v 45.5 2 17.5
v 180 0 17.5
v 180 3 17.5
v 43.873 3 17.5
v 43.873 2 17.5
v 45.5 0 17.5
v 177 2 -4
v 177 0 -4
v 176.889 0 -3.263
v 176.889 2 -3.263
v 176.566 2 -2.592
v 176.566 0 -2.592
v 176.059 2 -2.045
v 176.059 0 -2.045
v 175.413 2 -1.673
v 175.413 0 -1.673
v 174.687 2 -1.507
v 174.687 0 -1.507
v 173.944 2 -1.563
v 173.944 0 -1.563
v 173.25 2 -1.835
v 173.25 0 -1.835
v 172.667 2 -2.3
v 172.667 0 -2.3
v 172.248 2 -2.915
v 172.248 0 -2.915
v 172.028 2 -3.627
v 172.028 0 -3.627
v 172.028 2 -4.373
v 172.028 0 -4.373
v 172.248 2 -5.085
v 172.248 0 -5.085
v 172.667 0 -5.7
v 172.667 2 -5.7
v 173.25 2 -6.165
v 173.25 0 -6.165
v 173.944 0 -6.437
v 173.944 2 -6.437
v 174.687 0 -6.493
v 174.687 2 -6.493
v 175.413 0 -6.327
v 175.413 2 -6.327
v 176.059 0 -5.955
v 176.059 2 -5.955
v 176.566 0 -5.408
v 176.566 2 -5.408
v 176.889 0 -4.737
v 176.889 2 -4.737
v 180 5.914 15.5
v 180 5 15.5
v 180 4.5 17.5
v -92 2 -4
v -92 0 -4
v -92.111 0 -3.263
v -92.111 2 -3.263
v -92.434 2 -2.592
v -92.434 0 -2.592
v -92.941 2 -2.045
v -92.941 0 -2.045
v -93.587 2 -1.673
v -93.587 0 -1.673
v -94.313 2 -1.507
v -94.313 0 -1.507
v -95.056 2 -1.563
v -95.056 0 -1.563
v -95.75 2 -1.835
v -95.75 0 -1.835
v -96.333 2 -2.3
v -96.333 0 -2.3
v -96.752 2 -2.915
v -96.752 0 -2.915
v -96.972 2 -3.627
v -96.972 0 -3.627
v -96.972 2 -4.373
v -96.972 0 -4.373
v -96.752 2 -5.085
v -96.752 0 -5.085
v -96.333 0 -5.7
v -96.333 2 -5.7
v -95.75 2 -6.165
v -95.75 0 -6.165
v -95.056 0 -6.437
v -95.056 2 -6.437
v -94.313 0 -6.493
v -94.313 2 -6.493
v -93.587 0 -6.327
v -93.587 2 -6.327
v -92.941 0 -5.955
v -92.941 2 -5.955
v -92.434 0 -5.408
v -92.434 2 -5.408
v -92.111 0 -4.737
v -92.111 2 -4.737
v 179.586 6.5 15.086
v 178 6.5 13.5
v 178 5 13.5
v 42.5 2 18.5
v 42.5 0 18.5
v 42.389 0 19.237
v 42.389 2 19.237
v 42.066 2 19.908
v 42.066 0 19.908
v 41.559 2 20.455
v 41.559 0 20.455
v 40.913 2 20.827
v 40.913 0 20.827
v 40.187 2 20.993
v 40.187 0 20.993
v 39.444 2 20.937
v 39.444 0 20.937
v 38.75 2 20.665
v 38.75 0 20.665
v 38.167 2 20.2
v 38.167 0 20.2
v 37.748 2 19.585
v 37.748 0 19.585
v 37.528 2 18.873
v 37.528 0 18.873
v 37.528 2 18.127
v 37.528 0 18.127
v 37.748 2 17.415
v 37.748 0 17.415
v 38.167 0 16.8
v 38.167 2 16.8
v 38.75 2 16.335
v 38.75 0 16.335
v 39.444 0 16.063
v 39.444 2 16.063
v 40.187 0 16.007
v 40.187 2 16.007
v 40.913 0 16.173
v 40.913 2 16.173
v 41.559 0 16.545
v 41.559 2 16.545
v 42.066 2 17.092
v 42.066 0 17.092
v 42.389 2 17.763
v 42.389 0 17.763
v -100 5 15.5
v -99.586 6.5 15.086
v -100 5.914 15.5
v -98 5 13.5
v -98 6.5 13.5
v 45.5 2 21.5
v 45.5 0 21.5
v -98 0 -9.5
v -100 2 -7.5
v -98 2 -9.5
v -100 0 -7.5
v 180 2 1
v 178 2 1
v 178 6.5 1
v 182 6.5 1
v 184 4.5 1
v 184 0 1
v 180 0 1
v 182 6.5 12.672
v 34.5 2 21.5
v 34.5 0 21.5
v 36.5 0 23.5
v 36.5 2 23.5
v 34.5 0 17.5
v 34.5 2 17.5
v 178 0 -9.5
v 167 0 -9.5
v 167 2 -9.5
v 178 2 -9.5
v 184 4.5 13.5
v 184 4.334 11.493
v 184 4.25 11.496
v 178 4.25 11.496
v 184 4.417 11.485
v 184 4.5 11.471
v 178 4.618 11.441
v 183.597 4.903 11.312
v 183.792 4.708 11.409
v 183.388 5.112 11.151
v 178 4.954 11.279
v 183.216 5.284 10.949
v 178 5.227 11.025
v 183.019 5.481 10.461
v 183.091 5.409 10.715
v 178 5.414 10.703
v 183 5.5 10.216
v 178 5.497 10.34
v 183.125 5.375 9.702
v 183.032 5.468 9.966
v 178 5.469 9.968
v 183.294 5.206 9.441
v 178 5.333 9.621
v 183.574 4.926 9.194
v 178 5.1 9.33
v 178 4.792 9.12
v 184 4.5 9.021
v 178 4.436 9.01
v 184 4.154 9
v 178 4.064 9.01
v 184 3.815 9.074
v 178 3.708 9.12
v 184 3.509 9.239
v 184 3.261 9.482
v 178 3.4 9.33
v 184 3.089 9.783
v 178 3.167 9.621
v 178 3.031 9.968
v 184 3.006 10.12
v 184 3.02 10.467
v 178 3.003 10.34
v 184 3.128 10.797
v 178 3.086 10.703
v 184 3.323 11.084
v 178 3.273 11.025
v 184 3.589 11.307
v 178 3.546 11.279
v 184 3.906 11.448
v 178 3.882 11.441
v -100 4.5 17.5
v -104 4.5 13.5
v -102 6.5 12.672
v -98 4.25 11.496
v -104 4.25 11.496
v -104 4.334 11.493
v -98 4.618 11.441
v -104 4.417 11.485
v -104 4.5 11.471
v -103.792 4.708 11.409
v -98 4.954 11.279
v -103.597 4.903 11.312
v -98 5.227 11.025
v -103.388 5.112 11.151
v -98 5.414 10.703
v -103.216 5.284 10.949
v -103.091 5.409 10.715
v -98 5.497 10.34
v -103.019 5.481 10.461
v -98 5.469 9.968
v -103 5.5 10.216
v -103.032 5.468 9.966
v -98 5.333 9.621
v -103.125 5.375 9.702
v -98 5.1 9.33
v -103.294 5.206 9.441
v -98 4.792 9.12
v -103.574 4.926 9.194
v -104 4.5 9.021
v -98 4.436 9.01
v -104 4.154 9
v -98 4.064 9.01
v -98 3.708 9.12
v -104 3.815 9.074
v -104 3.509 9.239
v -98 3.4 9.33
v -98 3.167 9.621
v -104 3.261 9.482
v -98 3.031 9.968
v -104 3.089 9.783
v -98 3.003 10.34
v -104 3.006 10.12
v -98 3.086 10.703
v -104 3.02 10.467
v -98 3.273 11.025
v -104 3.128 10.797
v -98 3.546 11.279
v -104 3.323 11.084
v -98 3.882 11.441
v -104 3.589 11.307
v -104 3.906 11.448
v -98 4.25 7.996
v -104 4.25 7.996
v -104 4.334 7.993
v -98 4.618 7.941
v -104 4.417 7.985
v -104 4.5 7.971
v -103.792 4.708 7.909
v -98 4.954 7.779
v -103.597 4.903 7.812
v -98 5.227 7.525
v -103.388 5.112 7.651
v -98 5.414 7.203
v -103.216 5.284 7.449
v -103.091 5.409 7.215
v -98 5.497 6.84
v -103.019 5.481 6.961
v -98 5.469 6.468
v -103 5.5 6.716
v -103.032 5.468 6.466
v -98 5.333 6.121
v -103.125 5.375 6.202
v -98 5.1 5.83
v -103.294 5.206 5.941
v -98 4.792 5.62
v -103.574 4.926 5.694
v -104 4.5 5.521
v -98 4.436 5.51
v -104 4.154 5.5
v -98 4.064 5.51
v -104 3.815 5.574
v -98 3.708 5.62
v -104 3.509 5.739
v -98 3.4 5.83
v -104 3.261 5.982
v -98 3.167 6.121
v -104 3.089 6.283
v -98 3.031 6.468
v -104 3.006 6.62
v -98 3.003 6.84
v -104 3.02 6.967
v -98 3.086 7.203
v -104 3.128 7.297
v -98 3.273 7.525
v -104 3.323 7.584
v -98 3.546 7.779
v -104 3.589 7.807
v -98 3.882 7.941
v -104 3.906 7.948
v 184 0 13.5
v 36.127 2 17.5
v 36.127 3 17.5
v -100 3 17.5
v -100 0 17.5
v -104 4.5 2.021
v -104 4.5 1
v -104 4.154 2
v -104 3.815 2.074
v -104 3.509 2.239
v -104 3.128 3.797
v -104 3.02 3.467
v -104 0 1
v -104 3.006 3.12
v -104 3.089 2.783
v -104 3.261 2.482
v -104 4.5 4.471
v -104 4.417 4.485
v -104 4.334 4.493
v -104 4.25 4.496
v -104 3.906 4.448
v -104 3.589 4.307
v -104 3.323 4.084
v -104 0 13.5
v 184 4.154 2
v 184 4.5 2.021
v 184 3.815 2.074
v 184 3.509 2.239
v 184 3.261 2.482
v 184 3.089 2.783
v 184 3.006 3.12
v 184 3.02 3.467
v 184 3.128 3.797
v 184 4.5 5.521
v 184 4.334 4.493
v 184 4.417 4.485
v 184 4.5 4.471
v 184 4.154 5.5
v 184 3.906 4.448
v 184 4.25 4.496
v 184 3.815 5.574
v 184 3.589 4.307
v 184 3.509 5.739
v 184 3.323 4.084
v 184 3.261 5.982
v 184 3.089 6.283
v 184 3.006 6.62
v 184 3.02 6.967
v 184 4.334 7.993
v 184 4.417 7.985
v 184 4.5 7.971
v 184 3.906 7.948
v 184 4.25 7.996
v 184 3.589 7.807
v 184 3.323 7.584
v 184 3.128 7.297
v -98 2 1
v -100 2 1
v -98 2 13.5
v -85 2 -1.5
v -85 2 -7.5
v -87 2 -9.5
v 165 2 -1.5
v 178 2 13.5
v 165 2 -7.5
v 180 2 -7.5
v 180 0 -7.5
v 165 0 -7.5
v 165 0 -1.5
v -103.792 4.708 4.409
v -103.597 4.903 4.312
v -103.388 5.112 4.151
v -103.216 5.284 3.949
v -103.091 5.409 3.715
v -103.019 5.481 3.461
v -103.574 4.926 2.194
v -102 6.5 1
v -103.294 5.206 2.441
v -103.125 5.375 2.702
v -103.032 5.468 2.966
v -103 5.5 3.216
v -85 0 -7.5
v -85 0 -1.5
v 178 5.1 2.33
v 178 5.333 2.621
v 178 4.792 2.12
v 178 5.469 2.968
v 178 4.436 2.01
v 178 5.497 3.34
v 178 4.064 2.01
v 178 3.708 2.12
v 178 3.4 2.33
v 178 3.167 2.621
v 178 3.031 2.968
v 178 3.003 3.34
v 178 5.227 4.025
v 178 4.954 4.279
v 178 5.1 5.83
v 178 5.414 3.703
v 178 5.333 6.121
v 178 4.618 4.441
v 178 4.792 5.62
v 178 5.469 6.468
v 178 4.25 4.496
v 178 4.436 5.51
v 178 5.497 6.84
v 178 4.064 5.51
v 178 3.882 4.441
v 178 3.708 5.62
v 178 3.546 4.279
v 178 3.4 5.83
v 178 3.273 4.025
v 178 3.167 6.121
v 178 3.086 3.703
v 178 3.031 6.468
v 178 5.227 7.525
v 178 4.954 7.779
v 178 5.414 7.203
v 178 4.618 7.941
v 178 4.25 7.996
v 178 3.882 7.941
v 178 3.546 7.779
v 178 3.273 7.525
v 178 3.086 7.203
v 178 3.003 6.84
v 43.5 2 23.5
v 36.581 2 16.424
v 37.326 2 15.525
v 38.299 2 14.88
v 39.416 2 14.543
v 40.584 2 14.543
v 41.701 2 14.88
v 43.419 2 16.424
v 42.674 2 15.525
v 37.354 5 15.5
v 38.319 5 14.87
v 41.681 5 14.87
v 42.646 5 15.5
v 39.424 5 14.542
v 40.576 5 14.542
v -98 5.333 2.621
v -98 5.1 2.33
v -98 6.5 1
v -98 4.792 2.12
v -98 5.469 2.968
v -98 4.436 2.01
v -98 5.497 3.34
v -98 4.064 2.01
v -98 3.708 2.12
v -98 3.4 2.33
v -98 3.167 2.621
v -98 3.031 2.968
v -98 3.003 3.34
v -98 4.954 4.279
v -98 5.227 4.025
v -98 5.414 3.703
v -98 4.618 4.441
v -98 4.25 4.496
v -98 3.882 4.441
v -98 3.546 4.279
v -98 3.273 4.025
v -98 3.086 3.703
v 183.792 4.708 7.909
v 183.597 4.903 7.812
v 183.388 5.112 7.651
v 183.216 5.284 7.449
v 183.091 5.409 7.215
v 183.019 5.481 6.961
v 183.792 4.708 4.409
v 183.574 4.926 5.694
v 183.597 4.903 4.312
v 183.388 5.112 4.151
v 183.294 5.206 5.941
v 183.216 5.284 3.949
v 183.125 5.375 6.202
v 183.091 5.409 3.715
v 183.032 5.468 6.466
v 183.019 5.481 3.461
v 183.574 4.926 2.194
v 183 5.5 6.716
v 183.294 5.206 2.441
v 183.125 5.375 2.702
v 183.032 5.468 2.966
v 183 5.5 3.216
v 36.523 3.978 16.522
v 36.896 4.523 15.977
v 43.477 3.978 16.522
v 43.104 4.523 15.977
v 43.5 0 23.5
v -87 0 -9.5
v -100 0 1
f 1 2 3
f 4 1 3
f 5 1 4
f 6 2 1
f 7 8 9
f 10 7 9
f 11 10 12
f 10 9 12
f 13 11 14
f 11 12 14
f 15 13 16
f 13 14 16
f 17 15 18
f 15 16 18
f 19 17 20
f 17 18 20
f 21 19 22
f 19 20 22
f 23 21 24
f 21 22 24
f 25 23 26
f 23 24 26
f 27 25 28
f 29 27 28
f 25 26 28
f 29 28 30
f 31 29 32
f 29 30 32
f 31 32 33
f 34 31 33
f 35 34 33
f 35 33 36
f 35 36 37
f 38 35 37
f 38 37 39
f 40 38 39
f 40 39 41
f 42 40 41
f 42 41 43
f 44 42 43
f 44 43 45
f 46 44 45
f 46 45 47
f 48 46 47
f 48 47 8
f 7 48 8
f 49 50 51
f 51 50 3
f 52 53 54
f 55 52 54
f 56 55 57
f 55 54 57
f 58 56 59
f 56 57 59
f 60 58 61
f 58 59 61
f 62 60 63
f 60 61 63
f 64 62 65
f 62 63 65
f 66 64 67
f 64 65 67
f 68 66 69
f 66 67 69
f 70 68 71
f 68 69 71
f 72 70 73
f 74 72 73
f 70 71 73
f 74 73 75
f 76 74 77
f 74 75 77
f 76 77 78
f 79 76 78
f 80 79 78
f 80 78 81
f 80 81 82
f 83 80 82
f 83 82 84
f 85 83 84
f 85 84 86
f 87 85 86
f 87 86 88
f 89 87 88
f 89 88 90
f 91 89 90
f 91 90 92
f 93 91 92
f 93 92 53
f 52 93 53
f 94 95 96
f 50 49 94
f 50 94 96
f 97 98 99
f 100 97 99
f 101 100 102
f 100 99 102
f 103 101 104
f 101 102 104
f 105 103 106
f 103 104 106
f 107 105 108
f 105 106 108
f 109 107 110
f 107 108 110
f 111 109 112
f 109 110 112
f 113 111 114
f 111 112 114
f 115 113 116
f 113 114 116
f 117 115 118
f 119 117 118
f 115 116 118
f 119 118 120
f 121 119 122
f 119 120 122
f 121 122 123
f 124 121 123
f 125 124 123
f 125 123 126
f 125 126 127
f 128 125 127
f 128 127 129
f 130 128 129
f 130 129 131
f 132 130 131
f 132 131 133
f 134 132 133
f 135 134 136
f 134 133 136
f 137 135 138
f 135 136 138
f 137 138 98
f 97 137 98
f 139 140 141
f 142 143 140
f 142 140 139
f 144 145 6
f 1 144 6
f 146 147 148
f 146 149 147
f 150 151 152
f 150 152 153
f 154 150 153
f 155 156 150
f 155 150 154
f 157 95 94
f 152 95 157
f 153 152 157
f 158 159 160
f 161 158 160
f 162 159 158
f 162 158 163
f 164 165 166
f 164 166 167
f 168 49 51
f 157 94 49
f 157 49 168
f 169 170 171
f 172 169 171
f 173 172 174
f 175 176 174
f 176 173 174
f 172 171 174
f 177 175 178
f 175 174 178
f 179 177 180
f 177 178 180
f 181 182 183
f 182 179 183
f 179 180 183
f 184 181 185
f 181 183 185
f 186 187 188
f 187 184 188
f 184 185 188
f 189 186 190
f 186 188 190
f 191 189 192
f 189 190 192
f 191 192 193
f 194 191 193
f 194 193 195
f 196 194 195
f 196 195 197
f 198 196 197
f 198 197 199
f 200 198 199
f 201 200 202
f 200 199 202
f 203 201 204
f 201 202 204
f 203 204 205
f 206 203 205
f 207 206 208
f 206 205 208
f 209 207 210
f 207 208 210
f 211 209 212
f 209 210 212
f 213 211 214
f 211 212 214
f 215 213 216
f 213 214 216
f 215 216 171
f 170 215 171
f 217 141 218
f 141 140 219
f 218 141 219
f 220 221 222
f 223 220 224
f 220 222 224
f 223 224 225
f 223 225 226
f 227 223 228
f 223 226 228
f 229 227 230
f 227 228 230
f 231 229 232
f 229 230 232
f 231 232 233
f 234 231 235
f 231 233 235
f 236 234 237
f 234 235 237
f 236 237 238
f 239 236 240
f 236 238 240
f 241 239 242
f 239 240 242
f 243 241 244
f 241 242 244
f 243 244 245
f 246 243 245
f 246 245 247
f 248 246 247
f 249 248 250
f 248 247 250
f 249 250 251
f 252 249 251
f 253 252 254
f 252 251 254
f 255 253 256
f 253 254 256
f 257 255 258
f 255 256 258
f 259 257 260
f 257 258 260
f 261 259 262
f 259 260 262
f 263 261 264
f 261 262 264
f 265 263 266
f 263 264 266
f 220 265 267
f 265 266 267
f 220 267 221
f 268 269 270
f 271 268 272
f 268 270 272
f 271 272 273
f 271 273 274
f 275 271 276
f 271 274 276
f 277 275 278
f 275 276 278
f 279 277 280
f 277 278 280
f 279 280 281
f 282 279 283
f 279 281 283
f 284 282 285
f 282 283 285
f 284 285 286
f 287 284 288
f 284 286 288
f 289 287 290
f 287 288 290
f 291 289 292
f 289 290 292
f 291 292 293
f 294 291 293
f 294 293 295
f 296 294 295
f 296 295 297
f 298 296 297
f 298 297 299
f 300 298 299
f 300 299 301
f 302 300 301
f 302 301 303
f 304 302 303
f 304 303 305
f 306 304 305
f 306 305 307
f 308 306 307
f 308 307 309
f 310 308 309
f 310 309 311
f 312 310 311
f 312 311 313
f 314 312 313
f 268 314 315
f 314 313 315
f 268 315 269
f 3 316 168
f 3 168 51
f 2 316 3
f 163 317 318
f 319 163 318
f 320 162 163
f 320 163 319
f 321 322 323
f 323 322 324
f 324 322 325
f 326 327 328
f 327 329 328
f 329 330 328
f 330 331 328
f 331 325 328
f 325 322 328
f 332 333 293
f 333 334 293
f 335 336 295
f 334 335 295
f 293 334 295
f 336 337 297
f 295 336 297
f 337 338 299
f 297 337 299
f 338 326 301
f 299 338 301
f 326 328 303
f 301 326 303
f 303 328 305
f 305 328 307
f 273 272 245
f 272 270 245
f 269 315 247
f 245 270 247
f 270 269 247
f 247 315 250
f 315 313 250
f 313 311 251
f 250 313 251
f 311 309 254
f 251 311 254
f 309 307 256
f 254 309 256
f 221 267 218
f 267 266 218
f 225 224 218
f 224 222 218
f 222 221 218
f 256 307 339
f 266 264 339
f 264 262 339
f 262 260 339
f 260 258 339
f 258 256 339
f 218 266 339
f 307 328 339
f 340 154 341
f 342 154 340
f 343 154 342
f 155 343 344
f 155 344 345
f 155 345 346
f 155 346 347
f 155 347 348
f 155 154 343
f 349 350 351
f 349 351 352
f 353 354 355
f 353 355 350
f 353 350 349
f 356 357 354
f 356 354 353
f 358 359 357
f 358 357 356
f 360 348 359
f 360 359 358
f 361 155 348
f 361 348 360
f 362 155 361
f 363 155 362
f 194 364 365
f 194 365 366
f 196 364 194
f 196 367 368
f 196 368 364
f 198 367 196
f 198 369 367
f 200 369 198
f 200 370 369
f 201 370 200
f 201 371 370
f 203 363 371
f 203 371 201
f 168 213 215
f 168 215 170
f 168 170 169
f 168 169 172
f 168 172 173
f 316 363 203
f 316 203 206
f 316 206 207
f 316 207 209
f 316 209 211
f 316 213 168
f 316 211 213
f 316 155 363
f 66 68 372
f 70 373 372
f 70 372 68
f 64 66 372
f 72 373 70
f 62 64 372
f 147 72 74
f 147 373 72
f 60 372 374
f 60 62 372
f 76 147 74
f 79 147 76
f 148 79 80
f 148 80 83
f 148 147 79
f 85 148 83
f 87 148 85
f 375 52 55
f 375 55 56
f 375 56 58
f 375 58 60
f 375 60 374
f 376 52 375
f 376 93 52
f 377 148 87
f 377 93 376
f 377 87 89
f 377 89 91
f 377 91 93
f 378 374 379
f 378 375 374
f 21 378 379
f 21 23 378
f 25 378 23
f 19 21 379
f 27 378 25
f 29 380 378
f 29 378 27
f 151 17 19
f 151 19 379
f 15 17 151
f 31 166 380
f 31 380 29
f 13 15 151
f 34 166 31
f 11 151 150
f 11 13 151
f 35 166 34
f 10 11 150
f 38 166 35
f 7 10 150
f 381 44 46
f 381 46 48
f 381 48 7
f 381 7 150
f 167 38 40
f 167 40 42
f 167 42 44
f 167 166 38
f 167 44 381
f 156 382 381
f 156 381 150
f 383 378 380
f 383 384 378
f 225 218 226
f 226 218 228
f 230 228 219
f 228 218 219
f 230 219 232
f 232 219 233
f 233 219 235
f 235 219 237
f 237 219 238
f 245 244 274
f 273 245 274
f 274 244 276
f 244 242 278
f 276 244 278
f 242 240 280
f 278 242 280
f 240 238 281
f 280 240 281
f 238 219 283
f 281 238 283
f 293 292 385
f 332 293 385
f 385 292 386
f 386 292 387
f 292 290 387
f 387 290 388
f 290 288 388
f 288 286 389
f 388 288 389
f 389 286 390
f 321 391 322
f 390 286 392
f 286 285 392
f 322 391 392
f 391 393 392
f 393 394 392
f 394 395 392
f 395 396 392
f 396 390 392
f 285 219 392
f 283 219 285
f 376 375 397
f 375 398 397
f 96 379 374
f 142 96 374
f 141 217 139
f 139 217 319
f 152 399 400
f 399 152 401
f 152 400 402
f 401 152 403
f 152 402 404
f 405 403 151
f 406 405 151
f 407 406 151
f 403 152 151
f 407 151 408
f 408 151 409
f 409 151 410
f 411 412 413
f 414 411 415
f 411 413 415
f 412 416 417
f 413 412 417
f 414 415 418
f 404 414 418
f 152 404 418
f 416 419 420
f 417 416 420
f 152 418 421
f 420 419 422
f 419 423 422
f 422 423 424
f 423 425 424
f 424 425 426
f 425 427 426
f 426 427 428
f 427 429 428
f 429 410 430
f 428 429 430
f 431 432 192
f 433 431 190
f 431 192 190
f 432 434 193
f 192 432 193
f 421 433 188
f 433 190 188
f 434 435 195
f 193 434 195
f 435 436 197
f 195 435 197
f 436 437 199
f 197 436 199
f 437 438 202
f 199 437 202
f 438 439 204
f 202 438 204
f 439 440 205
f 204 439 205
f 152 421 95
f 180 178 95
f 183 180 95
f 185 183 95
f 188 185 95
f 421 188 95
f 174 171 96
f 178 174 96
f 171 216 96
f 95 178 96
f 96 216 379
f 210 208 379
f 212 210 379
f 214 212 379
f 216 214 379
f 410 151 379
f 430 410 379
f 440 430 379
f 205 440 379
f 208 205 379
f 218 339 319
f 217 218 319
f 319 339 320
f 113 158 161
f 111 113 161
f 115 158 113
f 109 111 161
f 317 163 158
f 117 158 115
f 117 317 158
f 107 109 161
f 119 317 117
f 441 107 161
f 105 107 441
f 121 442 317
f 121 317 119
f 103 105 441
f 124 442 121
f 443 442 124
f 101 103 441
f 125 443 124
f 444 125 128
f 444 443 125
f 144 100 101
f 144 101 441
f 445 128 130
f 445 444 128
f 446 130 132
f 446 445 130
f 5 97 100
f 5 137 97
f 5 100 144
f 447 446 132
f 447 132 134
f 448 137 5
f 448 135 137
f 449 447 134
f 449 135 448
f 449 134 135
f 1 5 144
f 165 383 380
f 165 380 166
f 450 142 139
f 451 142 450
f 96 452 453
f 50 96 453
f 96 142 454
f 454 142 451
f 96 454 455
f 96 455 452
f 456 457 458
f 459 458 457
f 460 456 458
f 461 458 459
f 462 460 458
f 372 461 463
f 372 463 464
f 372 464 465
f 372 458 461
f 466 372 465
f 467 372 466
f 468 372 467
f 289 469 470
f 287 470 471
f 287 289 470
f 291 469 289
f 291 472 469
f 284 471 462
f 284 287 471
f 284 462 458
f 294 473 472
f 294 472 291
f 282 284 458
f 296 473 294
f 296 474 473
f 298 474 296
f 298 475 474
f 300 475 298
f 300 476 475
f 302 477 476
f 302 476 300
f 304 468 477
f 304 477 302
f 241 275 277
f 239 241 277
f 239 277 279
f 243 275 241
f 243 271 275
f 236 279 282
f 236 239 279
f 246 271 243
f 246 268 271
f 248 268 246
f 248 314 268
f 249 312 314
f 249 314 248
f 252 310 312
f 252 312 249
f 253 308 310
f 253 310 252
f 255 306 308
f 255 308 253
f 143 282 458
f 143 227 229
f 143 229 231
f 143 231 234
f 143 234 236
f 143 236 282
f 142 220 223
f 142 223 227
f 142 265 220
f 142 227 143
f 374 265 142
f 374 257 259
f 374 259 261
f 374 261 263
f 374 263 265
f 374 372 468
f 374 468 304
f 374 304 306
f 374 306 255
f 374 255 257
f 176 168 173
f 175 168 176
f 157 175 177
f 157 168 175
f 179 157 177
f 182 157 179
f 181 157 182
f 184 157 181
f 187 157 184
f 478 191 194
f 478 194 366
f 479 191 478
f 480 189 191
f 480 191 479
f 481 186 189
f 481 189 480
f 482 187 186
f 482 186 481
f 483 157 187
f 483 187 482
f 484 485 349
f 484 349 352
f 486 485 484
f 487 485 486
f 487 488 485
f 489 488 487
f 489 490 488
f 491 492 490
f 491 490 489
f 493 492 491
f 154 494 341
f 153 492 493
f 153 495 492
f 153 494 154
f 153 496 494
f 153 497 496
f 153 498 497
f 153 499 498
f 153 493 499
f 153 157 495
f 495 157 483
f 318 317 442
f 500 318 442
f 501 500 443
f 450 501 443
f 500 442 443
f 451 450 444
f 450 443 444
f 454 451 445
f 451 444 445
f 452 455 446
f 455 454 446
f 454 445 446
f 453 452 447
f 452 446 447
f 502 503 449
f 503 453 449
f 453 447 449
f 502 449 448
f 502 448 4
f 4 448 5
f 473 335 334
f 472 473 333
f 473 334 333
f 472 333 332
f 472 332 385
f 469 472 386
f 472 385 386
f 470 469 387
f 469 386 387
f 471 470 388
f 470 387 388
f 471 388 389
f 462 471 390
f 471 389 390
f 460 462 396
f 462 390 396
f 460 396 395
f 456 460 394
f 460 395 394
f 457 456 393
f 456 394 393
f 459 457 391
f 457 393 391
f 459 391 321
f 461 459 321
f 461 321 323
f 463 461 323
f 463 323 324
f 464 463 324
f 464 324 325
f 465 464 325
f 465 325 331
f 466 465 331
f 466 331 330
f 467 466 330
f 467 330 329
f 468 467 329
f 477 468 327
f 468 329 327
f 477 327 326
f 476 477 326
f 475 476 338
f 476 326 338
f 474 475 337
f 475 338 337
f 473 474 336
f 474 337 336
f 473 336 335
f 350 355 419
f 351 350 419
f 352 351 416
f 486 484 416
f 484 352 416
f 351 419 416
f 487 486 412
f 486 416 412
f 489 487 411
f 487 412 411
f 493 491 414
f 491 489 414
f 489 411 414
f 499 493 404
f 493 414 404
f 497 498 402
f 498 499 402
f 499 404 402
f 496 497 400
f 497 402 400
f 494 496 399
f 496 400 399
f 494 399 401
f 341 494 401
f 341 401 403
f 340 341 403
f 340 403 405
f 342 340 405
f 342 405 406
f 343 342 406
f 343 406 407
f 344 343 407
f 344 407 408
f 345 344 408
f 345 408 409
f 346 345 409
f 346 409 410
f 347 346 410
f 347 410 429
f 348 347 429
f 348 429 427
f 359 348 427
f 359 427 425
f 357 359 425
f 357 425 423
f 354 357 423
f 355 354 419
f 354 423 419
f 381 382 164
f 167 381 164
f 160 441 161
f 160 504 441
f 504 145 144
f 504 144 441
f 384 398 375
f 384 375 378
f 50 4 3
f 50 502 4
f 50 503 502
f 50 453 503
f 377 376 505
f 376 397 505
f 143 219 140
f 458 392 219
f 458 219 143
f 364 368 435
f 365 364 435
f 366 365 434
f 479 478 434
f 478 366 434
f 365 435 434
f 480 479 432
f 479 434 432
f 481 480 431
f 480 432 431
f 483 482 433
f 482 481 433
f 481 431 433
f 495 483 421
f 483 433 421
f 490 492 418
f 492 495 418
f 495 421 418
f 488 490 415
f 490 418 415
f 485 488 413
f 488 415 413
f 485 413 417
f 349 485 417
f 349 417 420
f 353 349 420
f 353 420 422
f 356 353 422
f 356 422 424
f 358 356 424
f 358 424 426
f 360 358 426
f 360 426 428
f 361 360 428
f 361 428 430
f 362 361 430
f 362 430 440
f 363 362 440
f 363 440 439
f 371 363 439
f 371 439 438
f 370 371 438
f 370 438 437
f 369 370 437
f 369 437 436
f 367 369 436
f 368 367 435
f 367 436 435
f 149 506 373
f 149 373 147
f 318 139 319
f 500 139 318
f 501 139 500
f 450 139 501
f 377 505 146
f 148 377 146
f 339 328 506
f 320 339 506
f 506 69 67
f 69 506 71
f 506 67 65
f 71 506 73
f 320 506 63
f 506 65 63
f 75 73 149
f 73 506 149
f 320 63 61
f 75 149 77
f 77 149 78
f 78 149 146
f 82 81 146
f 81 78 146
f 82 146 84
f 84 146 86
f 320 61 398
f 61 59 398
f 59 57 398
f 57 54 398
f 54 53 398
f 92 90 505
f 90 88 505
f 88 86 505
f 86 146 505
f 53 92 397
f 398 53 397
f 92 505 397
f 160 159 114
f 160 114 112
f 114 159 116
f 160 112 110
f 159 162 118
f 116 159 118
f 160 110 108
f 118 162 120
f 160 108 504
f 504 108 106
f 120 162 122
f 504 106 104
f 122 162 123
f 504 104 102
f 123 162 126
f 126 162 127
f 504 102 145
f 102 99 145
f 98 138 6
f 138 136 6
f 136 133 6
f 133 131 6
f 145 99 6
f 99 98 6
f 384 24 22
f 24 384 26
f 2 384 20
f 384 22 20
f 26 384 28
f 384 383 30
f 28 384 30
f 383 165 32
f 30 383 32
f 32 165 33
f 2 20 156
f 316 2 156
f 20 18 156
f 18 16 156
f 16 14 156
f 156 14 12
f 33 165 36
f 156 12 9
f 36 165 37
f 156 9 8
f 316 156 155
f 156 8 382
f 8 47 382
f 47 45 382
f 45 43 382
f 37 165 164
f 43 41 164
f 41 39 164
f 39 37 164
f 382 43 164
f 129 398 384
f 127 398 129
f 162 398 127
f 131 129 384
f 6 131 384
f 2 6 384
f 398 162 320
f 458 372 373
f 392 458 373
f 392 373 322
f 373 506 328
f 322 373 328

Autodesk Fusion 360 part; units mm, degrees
sketch "base" plane through (0, 0, 0) normal (0, 1, 0) x (1, 0, 0)
  line L0 (-100, 1.5) -> (180, 1.5)
  line L1 (180, 1.5) -> (180, -13.5)
  line L2 (180, -13.5) -> (-100, -13.5)
  line L3 (-100, -13.5) -> (-100, 1.5)
  line L4 (-100, -13.5) -> (180, -13.5)
  line L5 (180, -13.5) -> (180, -17.5)
  line L6 (180, -17.5) -> (-100, -17.5)
  line L7 (-100, -17.5) -> (-100, -13.5)
  line L8 (-100, 1.5) -> (-85, 1.5) construction
  circle A0 centre (-94.5, 4) radius 2.5
  line L9 (-100, 1.5) -> (-100, 7.5)
  line L10 (-100, 7.5) -> (-98, 9.5)
  line L11 (-85, 1.5) -> (-85, 7.5)
  line L12 (-85, 7.5) -> (-87, 9.5)
  line L13 (-87, 9.5) -> (-98, 9.5)
  line L14 (40, 6.0385) -> (40, -33.3841) construction
  line L15 (167, 9.5) -> (178, 9.5)
  line L16 (180, 7.5) -> (178, 9.5)
  line L17 (180, 1.5) -> (180, 7.5)
  circle A1 centre (174.5, 4) radius 2.5
  line L18 (165, 7.5) -> (167, 9.5)
  line L19 (165, 1.5) -> (165, 7.5)
  circle A2 centre (40, -18.5) radius 2.5
  line L20 (34.5, -21.5) -> (36.5, -21.5) construction
  line L21 (36.5, -21.5) -> (36.5, -23.5) construction
  line L22 (34.5, -21.5) -> (36.5, -23.5)
  line L23 (36.5, -23.5) -> (40, -23.5)
  circle A3 centre (40, -18.5) radius 3.75 construction
  circle A4 centre (40, -18.5) radius 4
  line L24 (34.5, -21.5) -> (34.5, -17.5)
  line L25 (45.5, -21.5) -> (45.5, -17.5)
  line L26 (45.5, -21.5) -> (43.5, -23.5)
  line L27 (43.5, -23.5) -> (40, -23.5)
  line L28 (-98, -13) -> (-98, -1) construction
  line L29 (-98, -1) -> (-104, -1)
  line L30 (-104, -1) -> (-104, -13.5)
  line L31 (-104, -13.5) -> (-100, -17.5)
  line L32 (-98, -1) -> (-98, -13.5)
  line L33 (178, -13) -> (178, -1) construction
  line L34 (178, -1) -> (178, -13.5)
  line L35 (178, -1) -> (184, -1)
  line L36 (184, -1) -> (184, -13.5)
  line L37 (184, -13.5) -> (180, -17.5)
  circle A5 centre (-94.5, 4) radius 3.75 construction
  circle A6 centre (174.5, 4) radius 3.75 construction
  dimension "d1" = 280
  dimension "d2" = 15
  dimension "d3" = 4
  dimension "d4" = 280
  dimension "d5" = 15
  dimension "d7" = 5
  dimension "d8" = 2.5
  dimension "d11" = 140
  dimension "d16" = 5
  dimension "d17" = 5
  dimension "d20" = 2
  dimension "d21" = 2
  dimension "d22" = 7.5
  dimension "d23" = 8
  dimension "d29" = 12.5
  dimension "d42" = 7.5
  dimension "d43" = 7.5
extrude "Extrude1" add sketch "base" along normal blind 2 contours L0 L1 L2 L3 L4 L29 L32 L34 L35 | L0 L9 L10 L11 L12 L13 | L0 L15 L16 L17 L18 L19 | L2 L3 L4 L29 L32 | L1 L2 L4 L34 L35 | L6 L22 L23 A4 L24 L25 L26 L27 | L6 A2 A4 | L6 A2 A4 makes body 1 at (-1.6667, 0, 8.5) makes body 2 at (39.9377, 0, 22.6643)
extrude "Extrude2" add sketch "base" along normal blind 5 contours L2 L4 L5 L6 L7 A4 bodies 1 2
chamfer "Chamfer1" distance 2 angle 45 2 edges at (-31.9365, 5, 17.5) (111.9365, 5, 17.5) on bodies 1
extrude "Extrude3" add sketch "base" along normal blind 6.5 contours L2 L3 L4 L29 L32 | L3 L7 L29 L30 L31 | L1 L5 L35 L36 L37 | L1 L2 L4 L34 L35 bodies 1
chamfer "Chamfer2" distance 2 angle 45 4 edges at (182, 6.5, 15.5) (184, 6.5, 7.25) (-102, 6.5, 15.5) (-104, 6.5, 7.25) on bodies 1
sketch "Sketch2" plane through (-104, 0, 0) normal (-1, 0, 0) x (0, 0, 1)
  line L0 (13.5, 4.5) -> (1, 4.5)
  line L1 (1, 4.5) -> (1, 0)
  line L2 (1, 0) -> (13.5, 0)
  line L3 (13.5, 0) -> (13.5, 4.5)
  circle A0 centre (3.2461, 4.25) radius 1.25
  line L4 (-7.5, 2) -> (1, 2)
  circle A1 centre (3.2461, 4.25) radius 1.25
  circle A2 centre (6.7461, 4.25) radius 1.25
  circle A3 centre (10.2461, 4.25) radius 1.25
  dimension "d33" = 2.5
  dimension "d36" = 2.25
  dimension "d37" = 2.5
  dimension "d38" = 2.5
  dimension "d39" = 2.5
extrude "Extrude4" cut sketch "Sketch2" against normal blind 300 contours L0 A3 | L0 A3 | L0 A2 | L0 A2 | L0 A0 A1 | L0 A0 A1 bodies 1
chamfer "Chamfer4" distance 2 angle 45 2 edges at (180, 5.75, 13.5) (-100, 5.75, 13.5) on bodies 1
